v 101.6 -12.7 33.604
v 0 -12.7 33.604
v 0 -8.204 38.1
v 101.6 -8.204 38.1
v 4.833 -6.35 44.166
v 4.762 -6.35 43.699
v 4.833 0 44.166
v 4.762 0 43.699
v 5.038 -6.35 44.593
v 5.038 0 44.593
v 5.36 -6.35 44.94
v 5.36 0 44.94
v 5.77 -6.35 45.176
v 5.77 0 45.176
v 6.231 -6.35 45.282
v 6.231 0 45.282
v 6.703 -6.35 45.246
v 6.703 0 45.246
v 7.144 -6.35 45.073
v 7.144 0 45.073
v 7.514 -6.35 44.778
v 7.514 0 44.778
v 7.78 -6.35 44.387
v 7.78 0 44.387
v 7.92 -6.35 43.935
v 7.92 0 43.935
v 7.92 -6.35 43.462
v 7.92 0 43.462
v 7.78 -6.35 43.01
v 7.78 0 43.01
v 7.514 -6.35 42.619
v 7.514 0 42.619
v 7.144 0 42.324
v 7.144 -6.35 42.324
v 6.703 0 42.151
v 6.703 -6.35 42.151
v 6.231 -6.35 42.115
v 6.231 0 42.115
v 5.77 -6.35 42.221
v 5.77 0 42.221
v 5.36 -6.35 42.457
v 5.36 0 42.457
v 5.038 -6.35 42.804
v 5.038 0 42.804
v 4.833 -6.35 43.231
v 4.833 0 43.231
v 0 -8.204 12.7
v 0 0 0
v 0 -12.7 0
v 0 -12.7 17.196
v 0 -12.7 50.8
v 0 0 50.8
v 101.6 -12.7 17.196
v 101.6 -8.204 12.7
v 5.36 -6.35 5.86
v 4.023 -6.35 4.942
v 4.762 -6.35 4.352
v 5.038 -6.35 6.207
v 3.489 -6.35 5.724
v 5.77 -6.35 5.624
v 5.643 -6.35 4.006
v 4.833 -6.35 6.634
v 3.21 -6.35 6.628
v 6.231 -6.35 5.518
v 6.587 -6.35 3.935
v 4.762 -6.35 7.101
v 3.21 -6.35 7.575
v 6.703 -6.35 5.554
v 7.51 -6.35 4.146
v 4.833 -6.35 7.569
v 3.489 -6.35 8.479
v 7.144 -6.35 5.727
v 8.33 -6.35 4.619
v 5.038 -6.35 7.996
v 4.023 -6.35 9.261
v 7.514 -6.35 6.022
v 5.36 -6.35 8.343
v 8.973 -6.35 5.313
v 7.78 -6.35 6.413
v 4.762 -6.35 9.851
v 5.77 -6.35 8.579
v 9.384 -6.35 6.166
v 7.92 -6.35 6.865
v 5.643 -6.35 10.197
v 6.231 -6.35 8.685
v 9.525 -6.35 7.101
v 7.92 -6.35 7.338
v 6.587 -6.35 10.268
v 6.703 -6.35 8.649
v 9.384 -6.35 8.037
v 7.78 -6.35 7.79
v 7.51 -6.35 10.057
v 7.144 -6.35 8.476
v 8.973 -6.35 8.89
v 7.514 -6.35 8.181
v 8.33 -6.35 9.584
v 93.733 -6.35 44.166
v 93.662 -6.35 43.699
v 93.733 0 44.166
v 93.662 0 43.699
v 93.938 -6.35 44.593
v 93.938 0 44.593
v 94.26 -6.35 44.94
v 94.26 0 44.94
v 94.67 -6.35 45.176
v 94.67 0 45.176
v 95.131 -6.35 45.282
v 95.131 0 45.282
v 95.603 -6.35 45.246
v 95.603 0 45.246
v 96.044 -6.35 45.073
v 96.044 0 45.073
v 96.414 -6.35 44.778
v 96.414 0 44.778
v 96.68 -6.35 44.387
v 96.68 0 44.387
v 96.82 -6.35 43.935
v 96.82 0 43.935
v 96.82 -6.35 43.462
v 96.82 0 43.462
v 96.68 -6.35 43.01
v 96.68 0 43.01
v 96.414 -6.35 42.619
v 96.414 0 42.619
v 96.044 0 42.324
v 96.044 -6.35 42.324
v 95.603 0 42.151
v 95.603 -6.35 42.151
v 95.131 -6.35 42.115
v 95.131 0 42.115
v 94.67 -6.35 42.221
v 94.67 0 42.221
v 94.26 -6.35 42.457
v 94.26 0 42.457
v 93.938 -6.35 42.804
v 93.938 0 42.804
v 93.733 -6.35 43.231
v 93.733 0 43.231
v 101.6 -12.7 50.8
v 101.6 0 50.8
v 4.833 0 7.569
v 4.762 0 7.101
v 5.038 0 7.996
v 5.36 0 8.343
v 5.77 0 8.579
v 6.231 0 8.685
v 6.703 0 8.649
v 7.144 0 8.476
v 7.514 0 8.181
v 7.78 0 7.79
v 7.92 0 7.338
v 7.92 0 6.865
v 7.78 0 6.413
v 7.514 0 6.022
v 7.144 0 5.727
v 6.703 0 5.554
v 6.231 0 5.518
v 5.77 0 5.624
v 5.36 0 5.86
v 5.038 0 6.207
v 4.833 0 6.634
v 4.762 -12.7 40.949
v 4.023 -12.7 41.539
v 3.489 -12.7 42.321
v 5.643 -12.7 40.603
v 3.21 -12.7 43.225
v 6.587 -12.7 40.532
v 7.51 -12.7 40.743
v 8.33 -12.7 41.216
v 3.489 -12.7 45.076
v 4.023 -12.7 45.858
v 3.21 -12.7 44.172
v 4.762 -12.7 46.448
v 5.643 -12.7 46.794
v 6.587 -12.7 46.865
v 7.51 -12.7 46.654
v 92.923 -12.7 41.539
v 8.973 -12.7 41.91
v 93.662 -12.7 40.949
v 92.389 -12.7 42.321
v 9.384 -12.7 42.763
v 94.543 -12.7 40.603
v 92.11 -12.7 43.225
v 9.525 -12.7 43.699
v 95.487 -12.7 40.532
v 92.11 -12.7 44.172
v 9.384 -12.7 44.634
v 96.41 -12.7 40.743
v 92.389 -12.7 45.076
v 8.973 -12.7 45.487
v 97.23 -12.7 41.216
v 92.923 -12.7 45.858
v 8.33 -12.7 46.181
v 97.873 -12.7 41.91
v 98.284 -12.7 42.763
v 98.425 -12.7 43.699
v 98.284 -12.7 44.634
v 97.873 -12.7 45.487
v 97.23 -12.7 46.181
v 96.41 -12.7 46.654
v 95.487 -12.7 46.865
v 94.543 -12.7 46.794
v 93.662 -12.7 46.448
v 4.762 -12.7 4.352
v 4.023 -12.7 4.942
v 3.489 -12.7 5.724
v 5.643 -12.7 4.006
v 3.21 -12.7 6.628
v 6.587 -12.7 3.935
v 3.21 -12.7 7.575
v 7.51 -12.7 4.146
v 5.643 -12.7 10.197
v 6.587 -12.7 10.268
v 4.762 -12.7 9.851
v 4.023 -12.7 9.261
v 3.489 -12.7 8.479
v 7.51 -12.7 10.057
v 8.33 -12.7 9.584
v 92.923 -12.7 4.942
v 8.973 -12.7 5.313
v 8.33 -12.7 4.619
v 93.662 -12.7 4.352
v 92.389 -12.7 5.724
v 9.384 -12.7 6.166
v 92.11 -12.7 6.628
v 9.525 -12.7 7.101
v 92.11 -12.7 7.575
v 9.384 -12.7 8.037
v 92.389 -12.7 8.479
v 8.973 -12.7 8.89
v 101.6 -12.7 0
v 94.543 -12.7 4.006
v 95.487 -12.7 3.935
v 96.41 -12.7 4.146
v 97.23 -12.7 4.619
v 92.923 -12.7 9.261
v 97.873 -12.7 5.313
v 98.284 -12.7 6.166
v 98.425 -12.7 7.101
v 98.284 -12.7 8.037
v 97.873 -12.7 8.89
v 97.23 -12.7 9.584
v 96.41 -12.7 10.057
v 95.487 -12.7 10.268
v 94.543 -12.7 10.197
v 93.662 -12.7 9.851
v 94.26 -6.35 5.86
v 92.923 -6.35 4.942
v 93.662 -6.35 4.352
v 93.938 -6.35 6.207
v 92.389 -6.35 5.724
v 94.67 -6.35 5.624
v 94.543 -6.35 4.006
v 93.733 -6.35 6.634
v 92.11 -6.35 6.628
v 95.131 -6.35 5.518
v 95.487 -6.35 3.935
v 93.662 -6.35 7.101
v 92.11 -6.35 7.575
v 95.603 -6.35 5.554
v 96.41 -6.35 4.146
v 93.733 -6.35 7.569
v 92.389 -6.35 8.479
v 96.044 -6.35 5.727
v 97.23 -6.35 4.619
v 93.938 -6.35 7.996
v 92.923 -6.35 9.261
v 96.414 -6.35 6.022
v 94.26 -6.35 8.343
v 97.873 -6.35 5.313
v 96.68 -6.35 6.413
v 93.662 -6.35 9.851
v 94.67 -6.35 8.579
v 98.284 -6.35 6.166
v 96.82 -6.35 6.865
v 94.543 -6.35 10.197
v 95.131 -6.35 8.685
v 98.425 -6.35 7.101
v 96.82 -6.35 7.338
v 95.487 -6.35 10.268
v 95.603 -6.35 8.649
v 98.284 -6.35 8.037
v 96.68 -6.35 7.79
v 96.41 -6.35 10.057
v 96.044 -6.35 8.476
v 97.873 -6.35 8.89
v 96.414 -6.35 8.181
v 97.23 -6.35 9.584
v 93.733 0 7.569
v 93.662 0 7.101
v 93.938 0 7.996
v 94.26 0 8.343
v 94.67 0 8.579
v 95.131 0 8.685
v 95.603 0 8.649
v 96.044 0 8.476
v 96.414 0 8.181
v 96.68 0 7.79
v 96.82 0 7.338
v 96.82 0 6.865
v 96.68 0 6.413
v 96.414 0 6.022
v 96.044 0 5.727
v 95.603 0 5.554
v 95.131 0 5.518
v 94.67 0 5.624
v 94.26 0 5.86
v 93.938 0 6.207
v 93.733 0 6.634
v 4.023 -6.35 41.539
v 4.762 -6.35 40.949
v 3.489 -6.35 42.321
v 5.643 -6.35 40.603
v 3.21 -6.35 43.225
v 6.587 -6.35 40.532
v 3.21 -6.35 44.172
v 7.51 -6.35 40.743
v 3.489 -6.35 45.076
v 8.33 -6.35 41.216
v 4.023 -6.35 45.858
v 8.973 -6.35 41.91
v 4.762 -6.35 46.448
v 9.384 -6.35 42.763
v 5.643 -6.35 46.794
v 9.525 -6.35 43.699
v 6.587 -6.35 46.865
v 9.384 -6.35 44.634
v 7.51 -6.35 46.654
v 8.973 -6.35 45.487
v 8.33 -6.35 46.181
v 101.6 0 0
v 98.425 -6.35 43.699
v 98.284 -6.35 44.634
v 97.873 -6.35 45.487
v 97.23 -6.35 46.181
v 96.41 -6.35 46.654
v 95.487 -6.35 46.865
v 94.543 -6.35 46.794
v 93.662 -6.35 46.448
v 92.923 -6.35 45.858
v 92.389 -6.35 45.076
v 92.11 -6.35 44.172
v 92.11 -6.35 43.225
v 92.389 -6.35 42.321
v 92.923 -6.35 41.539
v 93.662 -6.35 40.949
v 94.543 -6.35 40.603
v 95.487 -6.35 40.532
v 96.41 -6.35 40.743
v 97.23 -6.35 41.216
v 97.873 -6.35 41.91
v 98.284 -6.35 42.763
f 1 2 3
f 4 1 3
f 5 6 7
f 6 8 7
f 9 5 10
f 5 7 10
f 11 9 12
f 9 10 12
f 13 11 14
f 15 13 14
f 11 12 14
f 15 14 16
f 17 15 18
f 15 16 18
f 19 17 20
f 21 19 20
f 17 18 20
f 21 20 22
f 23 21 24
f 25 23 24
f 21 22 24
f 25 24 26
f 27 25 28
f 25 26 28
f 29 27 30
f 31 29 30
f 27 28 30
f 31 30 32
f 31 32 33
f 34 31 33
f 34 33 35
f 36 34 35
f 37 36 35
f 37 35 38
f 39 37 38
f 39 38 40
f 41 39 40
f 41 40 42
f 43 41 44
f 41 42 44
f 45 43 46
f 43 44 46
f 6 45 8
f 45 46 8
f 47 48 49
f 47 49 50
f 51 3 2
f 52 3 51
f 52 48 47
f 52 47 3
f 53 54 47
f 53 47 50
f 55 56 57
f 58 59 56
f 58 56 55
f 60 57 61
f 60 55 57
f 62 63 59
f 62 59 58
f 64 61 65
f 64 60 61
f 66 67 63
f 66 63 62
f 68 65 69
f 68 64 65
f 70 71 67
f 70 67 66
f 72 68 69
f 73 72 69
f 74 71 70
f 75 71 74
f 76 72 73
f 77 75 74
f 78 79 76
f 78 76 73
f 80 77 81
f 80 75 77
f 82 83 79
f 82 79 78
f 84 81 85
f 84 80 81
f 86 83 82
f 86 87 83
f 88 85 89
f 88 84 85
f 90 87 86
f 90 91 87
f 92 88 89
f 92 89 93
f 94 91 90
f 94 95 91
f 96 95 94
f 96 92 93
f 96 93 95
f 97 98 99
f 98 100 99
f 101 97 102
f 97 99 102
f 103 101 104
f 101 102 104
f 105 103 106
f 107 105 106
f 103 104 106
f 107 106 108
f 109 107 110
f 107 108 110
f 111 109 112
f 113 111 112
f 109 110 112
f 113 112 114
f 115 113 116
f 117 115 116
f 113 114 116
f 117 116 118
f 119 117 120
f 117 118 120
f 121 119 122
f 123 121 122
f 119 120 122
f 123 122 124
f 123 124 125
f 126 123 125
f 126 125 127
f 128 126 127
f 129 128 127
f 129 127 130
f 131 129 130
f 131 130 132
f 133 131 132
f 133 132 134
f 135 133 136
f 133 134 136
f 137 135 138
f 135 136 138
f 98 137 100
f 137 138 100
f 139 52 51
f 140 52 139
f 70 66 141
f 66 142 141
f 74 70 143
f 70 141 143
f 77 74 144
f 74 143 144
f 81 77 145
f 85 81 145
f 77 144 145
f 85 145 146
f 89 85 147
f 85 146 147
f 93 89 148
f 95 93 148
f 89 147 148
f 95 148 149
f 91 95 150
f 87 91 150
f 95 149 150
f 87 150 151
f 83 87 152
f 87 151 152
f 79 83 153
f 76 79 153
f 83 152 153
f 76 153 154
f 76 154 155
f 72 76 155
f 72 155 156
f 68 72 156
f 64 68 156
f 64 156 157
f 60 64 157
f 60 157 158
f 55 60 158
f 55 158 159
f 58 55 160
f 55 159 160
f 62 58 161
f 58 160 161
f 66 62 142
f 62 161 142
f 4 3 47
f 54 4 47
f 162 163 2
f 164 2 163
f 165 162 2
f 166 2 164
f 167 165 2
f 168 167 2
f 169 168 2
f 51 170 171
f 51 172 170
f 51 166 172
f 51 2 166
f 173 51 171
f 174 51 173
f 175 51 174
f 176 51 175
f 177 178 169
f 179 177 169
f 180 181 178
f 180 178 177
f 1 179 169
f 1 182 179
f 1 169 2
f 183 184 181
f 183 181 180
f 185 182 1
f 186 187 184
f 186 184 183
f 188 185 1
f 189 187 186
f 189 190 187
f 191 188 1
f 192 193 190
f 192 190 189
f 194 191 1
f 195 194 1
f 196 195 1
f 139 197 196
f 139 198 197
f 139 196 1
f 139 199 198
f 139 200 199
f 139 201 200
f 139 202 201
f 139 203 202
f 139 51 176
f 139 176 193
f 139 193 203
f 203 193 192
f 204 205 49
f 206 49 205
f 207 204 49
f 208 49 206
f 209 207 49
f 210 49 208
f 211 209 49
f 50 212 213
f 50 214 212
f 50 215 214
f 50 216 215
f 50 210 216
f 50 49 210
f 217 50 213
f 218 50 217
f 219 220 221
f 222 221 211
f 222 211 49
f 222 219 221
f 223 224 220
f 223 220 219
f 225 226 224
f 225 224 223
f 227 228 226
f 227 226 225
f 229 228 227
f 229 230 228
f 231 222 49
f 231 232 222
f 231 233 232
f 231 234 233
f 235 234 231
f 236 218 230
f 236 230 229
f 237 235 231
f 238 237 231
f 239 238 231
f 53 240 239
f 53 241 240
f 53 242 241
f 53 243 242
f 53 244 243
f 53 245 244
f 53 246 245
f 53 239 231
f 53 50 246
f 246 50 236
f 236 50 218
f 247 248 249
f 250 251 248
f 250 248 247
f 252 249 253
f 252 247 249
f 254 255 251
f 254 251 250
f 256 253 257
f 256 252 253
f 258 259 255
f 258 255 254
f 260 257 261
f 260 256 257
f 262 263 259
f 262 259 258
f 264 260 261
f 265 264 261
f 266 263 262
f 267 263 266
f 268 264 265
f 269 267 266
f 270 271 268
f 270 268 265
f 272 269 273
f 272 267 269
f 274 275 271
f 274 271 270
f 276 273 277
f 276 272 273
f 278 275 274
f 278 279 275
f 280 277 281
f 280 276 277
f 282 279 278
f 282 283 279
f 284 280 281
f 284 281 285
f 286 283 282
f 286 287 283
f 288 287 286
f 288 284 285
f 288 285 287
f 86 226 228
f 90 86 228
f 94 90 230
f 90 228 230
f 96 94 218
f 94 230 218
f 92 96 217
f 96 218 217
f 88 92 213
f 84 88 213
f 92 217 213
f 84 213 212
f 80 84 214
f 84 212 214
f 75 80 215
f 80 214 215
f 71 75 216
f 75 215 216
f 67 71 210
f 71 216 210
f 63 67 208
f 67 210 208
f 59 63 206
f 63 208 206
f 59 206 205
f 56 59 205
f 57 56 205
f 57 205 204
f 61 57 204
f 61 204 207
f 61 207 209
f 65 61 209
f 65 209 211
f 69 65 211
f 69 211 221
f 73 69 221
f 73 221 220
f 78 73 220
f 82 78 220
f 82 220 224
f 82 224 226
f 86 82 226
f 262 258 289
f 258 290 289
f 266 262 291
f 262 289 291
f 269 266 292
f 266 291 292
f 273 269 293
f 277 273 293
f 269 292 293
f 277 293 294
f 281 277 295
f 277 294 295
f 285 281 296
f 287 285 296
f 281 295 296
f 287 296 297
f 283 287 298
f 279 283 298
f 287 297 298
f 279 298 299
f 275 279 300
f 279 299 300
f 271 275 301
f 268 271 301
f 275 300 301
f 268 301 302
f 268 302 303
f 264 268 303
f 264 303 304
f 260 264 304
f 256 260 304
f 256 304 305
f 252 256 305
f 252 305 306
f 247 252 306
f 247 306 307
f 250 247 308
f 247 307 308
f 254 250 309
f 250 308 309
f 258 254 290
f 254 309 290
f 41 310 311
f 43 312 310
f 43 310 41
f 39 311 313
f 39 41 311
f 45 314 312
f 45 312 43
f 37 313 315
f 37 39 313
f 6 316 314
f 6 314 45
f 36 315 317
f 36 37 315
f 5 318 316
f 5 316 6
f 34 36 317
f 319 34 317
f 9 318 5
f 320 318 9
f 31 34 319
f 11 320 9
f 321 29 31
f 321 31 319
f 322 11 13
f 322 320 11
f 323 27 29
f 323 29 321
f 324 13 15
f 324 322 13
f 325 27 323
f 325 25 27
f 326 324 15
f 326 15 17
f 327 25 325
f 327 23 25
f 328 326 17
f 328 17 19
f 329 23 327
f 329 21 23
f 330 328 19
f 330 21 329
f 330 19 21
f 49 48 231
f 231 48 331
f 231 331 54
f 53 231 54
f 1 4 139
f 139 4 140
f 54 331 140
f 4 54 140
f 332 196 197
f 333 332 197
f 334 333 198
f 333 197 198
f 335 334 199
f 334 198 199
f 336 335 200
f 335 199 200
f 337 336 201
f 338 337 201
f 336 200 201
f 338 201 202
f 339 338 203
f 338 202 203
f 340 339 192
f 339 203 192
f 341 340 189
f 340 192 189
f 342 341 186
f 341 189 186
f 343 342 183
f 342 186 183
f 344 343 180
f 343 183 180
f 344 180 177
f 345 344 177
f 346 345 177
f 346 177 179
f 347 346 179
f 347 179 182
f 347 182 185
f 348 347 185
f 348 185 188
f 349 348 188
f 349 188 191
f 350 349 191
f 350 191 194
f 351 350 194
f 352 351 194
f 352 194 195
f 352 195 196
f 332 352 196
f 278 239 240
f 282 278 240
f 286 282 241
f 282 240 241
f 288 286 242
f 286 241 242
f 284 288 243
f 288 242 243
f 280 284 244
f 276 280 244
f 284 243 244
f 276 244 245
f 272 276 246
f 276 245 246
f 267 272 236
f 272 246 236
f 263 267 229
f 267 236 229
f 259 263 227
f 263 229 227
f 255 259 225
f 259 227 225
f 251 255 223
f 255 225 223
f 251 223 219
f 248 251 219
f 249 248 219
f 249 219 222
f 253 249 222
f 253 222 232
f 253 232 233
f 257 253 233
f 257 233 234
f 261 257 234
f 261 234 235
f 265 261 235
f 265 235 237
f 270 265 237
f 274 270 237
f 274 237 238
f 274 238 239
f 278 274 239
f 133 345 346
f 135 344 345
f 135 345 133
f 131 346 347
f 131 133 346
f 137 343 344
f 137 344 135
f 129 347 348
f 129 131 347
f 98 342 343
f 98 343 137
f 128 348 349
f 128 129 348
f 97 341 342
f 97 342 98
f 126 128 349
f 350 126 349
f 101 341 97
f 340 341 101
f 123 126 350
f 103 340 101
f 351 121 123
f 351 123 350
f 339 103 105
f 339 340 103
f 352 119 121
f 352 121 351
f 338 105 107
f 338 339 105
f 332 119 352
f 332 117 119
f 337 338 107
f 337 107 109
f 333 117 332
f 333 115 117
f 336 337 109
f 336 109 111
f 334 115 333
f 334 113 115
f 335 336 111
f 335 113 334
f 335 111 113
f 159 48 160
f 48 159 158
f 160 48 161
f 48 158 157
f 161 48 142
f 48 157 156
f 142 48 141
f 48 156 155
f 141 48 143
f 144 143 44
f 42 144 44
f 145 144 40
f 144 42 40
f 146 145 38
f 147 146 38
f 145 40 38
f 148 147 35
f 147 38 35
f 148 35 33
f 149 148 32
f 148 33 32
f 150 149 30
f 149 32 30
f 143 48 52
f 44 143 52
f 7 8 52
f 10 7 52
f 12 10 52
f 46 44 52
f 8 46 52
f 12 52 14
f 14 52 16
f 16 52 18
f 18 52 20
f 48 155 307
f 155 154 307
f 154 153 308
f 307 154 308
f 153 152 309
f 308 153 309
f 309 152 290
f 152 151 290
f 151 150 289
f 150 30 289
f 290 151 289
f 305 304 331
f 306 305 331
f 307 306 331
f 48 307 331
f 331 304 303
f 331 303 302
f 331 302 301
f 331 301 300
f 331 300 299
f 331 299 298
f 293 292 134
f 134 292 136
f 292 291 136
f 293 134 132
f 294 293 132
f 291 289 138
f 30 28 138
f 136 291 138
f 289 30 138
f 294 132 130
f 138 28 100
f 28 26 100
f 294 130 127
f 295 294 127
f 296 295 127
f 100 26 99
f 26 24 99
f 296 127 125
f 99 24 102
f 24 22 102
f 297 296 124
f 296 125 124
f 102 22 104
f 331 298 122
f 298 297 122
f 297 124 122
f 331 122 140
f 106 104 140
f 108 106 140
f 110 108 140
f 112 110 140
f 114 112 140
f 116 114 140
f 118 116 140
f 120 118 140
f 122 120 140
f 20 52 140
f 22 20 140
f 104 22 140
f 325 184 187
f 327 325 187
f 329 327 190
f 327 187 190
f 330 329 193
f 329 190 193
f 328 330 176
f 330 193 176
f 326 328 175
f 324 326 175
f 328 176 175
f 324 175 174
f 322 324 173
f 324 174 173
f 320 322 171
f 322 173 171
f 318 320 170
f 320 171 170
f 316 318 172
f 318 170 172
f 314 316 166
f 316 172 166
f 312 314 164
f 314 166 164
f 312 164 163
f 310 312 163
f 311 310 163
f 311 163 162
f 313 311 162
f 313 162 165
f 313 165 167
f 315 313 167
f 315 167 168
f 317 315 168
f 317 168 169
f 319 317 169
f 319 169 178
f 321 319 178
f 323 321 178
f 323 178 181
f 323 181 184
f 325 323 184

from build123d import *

# Parameters (mm, degrees)
F0_W           = 101.6
F0_H           = 50.8
F1_DEPTH       = 12.7
F3_D           = 3.175
F3_CBORE_D     = 6.35
F3_CBORE_DEPTH = 6.35
F5_DEPTH       = 101.601
F6_D           = 3.175
F6_CBORE_D     = 6.35
F6_CBORE_DEPTH = 6.35
F7_D           = 3.175
F7_CBORE_D     = 6.35
F7_CBORE_DEPTH = 6.35
F8_D           = 3.175
F8_CBORE_D     = 6.35
F8_CBORE_DEPTH = 6.35


with BuildPart() as f1:
    # F0 (on Front) → F1 (new body)
    with BuildSketch(Plane.XZ):
        with Locations((50.8, 25.4)):
            Rectangle(F0_W, F0_H)
    extrude(amount=F1_DEPTH)

    # F3 (through all)
    with Locations(Plane.XZ.offset(12.7)):
        with Locations((6.35, 7.101479)):
            CounterBoreHole(F3_D / 2, F3_CBORE_D / 2, F3_CBORE_DEPTH)

    # F4 (on face) → F5 (cut, through all)
    with BuildSketch(Plane(origin=(0, 0, 0), x_dir=(0, -1, 0), z_dir=(-1, 0, 0))):
        Polygon((12.7, 33.6042), (8.2042, 38.1), (8.2042, 12.7), (12.7, 17.1958), align=None)
    extrude(amount=-F5_DEPTH, mode=Mode.SUBTRACT)

    # F6 (through all)
    with Locations(Plane.XZ.offset(12.7)):
        with Locations((6.35, 43.698521)):
            CounterBoreHole(F6_D / 2, F6_CBORE_D / 2, F6_CBORE_DEPTH)

    # F7 (through all)
    with Locations(Plane.XZ.offset(12.7)):
        with Locations((95.25, 43.698521)):
            CounterBoreHole(F7_D / 2, F7_CBORE_D / 2, F7_CBORE_DEPTH)

    # F8 (through all)
    with Locations(Plane.XZ.offset(12.7)):
        with Locations((95.25, 7.101479)):
            CounterBoreHole(F8_D / 2, F8_CBORE_D / 2, F8_CBORE_DEPTH)


solid = f1.part
